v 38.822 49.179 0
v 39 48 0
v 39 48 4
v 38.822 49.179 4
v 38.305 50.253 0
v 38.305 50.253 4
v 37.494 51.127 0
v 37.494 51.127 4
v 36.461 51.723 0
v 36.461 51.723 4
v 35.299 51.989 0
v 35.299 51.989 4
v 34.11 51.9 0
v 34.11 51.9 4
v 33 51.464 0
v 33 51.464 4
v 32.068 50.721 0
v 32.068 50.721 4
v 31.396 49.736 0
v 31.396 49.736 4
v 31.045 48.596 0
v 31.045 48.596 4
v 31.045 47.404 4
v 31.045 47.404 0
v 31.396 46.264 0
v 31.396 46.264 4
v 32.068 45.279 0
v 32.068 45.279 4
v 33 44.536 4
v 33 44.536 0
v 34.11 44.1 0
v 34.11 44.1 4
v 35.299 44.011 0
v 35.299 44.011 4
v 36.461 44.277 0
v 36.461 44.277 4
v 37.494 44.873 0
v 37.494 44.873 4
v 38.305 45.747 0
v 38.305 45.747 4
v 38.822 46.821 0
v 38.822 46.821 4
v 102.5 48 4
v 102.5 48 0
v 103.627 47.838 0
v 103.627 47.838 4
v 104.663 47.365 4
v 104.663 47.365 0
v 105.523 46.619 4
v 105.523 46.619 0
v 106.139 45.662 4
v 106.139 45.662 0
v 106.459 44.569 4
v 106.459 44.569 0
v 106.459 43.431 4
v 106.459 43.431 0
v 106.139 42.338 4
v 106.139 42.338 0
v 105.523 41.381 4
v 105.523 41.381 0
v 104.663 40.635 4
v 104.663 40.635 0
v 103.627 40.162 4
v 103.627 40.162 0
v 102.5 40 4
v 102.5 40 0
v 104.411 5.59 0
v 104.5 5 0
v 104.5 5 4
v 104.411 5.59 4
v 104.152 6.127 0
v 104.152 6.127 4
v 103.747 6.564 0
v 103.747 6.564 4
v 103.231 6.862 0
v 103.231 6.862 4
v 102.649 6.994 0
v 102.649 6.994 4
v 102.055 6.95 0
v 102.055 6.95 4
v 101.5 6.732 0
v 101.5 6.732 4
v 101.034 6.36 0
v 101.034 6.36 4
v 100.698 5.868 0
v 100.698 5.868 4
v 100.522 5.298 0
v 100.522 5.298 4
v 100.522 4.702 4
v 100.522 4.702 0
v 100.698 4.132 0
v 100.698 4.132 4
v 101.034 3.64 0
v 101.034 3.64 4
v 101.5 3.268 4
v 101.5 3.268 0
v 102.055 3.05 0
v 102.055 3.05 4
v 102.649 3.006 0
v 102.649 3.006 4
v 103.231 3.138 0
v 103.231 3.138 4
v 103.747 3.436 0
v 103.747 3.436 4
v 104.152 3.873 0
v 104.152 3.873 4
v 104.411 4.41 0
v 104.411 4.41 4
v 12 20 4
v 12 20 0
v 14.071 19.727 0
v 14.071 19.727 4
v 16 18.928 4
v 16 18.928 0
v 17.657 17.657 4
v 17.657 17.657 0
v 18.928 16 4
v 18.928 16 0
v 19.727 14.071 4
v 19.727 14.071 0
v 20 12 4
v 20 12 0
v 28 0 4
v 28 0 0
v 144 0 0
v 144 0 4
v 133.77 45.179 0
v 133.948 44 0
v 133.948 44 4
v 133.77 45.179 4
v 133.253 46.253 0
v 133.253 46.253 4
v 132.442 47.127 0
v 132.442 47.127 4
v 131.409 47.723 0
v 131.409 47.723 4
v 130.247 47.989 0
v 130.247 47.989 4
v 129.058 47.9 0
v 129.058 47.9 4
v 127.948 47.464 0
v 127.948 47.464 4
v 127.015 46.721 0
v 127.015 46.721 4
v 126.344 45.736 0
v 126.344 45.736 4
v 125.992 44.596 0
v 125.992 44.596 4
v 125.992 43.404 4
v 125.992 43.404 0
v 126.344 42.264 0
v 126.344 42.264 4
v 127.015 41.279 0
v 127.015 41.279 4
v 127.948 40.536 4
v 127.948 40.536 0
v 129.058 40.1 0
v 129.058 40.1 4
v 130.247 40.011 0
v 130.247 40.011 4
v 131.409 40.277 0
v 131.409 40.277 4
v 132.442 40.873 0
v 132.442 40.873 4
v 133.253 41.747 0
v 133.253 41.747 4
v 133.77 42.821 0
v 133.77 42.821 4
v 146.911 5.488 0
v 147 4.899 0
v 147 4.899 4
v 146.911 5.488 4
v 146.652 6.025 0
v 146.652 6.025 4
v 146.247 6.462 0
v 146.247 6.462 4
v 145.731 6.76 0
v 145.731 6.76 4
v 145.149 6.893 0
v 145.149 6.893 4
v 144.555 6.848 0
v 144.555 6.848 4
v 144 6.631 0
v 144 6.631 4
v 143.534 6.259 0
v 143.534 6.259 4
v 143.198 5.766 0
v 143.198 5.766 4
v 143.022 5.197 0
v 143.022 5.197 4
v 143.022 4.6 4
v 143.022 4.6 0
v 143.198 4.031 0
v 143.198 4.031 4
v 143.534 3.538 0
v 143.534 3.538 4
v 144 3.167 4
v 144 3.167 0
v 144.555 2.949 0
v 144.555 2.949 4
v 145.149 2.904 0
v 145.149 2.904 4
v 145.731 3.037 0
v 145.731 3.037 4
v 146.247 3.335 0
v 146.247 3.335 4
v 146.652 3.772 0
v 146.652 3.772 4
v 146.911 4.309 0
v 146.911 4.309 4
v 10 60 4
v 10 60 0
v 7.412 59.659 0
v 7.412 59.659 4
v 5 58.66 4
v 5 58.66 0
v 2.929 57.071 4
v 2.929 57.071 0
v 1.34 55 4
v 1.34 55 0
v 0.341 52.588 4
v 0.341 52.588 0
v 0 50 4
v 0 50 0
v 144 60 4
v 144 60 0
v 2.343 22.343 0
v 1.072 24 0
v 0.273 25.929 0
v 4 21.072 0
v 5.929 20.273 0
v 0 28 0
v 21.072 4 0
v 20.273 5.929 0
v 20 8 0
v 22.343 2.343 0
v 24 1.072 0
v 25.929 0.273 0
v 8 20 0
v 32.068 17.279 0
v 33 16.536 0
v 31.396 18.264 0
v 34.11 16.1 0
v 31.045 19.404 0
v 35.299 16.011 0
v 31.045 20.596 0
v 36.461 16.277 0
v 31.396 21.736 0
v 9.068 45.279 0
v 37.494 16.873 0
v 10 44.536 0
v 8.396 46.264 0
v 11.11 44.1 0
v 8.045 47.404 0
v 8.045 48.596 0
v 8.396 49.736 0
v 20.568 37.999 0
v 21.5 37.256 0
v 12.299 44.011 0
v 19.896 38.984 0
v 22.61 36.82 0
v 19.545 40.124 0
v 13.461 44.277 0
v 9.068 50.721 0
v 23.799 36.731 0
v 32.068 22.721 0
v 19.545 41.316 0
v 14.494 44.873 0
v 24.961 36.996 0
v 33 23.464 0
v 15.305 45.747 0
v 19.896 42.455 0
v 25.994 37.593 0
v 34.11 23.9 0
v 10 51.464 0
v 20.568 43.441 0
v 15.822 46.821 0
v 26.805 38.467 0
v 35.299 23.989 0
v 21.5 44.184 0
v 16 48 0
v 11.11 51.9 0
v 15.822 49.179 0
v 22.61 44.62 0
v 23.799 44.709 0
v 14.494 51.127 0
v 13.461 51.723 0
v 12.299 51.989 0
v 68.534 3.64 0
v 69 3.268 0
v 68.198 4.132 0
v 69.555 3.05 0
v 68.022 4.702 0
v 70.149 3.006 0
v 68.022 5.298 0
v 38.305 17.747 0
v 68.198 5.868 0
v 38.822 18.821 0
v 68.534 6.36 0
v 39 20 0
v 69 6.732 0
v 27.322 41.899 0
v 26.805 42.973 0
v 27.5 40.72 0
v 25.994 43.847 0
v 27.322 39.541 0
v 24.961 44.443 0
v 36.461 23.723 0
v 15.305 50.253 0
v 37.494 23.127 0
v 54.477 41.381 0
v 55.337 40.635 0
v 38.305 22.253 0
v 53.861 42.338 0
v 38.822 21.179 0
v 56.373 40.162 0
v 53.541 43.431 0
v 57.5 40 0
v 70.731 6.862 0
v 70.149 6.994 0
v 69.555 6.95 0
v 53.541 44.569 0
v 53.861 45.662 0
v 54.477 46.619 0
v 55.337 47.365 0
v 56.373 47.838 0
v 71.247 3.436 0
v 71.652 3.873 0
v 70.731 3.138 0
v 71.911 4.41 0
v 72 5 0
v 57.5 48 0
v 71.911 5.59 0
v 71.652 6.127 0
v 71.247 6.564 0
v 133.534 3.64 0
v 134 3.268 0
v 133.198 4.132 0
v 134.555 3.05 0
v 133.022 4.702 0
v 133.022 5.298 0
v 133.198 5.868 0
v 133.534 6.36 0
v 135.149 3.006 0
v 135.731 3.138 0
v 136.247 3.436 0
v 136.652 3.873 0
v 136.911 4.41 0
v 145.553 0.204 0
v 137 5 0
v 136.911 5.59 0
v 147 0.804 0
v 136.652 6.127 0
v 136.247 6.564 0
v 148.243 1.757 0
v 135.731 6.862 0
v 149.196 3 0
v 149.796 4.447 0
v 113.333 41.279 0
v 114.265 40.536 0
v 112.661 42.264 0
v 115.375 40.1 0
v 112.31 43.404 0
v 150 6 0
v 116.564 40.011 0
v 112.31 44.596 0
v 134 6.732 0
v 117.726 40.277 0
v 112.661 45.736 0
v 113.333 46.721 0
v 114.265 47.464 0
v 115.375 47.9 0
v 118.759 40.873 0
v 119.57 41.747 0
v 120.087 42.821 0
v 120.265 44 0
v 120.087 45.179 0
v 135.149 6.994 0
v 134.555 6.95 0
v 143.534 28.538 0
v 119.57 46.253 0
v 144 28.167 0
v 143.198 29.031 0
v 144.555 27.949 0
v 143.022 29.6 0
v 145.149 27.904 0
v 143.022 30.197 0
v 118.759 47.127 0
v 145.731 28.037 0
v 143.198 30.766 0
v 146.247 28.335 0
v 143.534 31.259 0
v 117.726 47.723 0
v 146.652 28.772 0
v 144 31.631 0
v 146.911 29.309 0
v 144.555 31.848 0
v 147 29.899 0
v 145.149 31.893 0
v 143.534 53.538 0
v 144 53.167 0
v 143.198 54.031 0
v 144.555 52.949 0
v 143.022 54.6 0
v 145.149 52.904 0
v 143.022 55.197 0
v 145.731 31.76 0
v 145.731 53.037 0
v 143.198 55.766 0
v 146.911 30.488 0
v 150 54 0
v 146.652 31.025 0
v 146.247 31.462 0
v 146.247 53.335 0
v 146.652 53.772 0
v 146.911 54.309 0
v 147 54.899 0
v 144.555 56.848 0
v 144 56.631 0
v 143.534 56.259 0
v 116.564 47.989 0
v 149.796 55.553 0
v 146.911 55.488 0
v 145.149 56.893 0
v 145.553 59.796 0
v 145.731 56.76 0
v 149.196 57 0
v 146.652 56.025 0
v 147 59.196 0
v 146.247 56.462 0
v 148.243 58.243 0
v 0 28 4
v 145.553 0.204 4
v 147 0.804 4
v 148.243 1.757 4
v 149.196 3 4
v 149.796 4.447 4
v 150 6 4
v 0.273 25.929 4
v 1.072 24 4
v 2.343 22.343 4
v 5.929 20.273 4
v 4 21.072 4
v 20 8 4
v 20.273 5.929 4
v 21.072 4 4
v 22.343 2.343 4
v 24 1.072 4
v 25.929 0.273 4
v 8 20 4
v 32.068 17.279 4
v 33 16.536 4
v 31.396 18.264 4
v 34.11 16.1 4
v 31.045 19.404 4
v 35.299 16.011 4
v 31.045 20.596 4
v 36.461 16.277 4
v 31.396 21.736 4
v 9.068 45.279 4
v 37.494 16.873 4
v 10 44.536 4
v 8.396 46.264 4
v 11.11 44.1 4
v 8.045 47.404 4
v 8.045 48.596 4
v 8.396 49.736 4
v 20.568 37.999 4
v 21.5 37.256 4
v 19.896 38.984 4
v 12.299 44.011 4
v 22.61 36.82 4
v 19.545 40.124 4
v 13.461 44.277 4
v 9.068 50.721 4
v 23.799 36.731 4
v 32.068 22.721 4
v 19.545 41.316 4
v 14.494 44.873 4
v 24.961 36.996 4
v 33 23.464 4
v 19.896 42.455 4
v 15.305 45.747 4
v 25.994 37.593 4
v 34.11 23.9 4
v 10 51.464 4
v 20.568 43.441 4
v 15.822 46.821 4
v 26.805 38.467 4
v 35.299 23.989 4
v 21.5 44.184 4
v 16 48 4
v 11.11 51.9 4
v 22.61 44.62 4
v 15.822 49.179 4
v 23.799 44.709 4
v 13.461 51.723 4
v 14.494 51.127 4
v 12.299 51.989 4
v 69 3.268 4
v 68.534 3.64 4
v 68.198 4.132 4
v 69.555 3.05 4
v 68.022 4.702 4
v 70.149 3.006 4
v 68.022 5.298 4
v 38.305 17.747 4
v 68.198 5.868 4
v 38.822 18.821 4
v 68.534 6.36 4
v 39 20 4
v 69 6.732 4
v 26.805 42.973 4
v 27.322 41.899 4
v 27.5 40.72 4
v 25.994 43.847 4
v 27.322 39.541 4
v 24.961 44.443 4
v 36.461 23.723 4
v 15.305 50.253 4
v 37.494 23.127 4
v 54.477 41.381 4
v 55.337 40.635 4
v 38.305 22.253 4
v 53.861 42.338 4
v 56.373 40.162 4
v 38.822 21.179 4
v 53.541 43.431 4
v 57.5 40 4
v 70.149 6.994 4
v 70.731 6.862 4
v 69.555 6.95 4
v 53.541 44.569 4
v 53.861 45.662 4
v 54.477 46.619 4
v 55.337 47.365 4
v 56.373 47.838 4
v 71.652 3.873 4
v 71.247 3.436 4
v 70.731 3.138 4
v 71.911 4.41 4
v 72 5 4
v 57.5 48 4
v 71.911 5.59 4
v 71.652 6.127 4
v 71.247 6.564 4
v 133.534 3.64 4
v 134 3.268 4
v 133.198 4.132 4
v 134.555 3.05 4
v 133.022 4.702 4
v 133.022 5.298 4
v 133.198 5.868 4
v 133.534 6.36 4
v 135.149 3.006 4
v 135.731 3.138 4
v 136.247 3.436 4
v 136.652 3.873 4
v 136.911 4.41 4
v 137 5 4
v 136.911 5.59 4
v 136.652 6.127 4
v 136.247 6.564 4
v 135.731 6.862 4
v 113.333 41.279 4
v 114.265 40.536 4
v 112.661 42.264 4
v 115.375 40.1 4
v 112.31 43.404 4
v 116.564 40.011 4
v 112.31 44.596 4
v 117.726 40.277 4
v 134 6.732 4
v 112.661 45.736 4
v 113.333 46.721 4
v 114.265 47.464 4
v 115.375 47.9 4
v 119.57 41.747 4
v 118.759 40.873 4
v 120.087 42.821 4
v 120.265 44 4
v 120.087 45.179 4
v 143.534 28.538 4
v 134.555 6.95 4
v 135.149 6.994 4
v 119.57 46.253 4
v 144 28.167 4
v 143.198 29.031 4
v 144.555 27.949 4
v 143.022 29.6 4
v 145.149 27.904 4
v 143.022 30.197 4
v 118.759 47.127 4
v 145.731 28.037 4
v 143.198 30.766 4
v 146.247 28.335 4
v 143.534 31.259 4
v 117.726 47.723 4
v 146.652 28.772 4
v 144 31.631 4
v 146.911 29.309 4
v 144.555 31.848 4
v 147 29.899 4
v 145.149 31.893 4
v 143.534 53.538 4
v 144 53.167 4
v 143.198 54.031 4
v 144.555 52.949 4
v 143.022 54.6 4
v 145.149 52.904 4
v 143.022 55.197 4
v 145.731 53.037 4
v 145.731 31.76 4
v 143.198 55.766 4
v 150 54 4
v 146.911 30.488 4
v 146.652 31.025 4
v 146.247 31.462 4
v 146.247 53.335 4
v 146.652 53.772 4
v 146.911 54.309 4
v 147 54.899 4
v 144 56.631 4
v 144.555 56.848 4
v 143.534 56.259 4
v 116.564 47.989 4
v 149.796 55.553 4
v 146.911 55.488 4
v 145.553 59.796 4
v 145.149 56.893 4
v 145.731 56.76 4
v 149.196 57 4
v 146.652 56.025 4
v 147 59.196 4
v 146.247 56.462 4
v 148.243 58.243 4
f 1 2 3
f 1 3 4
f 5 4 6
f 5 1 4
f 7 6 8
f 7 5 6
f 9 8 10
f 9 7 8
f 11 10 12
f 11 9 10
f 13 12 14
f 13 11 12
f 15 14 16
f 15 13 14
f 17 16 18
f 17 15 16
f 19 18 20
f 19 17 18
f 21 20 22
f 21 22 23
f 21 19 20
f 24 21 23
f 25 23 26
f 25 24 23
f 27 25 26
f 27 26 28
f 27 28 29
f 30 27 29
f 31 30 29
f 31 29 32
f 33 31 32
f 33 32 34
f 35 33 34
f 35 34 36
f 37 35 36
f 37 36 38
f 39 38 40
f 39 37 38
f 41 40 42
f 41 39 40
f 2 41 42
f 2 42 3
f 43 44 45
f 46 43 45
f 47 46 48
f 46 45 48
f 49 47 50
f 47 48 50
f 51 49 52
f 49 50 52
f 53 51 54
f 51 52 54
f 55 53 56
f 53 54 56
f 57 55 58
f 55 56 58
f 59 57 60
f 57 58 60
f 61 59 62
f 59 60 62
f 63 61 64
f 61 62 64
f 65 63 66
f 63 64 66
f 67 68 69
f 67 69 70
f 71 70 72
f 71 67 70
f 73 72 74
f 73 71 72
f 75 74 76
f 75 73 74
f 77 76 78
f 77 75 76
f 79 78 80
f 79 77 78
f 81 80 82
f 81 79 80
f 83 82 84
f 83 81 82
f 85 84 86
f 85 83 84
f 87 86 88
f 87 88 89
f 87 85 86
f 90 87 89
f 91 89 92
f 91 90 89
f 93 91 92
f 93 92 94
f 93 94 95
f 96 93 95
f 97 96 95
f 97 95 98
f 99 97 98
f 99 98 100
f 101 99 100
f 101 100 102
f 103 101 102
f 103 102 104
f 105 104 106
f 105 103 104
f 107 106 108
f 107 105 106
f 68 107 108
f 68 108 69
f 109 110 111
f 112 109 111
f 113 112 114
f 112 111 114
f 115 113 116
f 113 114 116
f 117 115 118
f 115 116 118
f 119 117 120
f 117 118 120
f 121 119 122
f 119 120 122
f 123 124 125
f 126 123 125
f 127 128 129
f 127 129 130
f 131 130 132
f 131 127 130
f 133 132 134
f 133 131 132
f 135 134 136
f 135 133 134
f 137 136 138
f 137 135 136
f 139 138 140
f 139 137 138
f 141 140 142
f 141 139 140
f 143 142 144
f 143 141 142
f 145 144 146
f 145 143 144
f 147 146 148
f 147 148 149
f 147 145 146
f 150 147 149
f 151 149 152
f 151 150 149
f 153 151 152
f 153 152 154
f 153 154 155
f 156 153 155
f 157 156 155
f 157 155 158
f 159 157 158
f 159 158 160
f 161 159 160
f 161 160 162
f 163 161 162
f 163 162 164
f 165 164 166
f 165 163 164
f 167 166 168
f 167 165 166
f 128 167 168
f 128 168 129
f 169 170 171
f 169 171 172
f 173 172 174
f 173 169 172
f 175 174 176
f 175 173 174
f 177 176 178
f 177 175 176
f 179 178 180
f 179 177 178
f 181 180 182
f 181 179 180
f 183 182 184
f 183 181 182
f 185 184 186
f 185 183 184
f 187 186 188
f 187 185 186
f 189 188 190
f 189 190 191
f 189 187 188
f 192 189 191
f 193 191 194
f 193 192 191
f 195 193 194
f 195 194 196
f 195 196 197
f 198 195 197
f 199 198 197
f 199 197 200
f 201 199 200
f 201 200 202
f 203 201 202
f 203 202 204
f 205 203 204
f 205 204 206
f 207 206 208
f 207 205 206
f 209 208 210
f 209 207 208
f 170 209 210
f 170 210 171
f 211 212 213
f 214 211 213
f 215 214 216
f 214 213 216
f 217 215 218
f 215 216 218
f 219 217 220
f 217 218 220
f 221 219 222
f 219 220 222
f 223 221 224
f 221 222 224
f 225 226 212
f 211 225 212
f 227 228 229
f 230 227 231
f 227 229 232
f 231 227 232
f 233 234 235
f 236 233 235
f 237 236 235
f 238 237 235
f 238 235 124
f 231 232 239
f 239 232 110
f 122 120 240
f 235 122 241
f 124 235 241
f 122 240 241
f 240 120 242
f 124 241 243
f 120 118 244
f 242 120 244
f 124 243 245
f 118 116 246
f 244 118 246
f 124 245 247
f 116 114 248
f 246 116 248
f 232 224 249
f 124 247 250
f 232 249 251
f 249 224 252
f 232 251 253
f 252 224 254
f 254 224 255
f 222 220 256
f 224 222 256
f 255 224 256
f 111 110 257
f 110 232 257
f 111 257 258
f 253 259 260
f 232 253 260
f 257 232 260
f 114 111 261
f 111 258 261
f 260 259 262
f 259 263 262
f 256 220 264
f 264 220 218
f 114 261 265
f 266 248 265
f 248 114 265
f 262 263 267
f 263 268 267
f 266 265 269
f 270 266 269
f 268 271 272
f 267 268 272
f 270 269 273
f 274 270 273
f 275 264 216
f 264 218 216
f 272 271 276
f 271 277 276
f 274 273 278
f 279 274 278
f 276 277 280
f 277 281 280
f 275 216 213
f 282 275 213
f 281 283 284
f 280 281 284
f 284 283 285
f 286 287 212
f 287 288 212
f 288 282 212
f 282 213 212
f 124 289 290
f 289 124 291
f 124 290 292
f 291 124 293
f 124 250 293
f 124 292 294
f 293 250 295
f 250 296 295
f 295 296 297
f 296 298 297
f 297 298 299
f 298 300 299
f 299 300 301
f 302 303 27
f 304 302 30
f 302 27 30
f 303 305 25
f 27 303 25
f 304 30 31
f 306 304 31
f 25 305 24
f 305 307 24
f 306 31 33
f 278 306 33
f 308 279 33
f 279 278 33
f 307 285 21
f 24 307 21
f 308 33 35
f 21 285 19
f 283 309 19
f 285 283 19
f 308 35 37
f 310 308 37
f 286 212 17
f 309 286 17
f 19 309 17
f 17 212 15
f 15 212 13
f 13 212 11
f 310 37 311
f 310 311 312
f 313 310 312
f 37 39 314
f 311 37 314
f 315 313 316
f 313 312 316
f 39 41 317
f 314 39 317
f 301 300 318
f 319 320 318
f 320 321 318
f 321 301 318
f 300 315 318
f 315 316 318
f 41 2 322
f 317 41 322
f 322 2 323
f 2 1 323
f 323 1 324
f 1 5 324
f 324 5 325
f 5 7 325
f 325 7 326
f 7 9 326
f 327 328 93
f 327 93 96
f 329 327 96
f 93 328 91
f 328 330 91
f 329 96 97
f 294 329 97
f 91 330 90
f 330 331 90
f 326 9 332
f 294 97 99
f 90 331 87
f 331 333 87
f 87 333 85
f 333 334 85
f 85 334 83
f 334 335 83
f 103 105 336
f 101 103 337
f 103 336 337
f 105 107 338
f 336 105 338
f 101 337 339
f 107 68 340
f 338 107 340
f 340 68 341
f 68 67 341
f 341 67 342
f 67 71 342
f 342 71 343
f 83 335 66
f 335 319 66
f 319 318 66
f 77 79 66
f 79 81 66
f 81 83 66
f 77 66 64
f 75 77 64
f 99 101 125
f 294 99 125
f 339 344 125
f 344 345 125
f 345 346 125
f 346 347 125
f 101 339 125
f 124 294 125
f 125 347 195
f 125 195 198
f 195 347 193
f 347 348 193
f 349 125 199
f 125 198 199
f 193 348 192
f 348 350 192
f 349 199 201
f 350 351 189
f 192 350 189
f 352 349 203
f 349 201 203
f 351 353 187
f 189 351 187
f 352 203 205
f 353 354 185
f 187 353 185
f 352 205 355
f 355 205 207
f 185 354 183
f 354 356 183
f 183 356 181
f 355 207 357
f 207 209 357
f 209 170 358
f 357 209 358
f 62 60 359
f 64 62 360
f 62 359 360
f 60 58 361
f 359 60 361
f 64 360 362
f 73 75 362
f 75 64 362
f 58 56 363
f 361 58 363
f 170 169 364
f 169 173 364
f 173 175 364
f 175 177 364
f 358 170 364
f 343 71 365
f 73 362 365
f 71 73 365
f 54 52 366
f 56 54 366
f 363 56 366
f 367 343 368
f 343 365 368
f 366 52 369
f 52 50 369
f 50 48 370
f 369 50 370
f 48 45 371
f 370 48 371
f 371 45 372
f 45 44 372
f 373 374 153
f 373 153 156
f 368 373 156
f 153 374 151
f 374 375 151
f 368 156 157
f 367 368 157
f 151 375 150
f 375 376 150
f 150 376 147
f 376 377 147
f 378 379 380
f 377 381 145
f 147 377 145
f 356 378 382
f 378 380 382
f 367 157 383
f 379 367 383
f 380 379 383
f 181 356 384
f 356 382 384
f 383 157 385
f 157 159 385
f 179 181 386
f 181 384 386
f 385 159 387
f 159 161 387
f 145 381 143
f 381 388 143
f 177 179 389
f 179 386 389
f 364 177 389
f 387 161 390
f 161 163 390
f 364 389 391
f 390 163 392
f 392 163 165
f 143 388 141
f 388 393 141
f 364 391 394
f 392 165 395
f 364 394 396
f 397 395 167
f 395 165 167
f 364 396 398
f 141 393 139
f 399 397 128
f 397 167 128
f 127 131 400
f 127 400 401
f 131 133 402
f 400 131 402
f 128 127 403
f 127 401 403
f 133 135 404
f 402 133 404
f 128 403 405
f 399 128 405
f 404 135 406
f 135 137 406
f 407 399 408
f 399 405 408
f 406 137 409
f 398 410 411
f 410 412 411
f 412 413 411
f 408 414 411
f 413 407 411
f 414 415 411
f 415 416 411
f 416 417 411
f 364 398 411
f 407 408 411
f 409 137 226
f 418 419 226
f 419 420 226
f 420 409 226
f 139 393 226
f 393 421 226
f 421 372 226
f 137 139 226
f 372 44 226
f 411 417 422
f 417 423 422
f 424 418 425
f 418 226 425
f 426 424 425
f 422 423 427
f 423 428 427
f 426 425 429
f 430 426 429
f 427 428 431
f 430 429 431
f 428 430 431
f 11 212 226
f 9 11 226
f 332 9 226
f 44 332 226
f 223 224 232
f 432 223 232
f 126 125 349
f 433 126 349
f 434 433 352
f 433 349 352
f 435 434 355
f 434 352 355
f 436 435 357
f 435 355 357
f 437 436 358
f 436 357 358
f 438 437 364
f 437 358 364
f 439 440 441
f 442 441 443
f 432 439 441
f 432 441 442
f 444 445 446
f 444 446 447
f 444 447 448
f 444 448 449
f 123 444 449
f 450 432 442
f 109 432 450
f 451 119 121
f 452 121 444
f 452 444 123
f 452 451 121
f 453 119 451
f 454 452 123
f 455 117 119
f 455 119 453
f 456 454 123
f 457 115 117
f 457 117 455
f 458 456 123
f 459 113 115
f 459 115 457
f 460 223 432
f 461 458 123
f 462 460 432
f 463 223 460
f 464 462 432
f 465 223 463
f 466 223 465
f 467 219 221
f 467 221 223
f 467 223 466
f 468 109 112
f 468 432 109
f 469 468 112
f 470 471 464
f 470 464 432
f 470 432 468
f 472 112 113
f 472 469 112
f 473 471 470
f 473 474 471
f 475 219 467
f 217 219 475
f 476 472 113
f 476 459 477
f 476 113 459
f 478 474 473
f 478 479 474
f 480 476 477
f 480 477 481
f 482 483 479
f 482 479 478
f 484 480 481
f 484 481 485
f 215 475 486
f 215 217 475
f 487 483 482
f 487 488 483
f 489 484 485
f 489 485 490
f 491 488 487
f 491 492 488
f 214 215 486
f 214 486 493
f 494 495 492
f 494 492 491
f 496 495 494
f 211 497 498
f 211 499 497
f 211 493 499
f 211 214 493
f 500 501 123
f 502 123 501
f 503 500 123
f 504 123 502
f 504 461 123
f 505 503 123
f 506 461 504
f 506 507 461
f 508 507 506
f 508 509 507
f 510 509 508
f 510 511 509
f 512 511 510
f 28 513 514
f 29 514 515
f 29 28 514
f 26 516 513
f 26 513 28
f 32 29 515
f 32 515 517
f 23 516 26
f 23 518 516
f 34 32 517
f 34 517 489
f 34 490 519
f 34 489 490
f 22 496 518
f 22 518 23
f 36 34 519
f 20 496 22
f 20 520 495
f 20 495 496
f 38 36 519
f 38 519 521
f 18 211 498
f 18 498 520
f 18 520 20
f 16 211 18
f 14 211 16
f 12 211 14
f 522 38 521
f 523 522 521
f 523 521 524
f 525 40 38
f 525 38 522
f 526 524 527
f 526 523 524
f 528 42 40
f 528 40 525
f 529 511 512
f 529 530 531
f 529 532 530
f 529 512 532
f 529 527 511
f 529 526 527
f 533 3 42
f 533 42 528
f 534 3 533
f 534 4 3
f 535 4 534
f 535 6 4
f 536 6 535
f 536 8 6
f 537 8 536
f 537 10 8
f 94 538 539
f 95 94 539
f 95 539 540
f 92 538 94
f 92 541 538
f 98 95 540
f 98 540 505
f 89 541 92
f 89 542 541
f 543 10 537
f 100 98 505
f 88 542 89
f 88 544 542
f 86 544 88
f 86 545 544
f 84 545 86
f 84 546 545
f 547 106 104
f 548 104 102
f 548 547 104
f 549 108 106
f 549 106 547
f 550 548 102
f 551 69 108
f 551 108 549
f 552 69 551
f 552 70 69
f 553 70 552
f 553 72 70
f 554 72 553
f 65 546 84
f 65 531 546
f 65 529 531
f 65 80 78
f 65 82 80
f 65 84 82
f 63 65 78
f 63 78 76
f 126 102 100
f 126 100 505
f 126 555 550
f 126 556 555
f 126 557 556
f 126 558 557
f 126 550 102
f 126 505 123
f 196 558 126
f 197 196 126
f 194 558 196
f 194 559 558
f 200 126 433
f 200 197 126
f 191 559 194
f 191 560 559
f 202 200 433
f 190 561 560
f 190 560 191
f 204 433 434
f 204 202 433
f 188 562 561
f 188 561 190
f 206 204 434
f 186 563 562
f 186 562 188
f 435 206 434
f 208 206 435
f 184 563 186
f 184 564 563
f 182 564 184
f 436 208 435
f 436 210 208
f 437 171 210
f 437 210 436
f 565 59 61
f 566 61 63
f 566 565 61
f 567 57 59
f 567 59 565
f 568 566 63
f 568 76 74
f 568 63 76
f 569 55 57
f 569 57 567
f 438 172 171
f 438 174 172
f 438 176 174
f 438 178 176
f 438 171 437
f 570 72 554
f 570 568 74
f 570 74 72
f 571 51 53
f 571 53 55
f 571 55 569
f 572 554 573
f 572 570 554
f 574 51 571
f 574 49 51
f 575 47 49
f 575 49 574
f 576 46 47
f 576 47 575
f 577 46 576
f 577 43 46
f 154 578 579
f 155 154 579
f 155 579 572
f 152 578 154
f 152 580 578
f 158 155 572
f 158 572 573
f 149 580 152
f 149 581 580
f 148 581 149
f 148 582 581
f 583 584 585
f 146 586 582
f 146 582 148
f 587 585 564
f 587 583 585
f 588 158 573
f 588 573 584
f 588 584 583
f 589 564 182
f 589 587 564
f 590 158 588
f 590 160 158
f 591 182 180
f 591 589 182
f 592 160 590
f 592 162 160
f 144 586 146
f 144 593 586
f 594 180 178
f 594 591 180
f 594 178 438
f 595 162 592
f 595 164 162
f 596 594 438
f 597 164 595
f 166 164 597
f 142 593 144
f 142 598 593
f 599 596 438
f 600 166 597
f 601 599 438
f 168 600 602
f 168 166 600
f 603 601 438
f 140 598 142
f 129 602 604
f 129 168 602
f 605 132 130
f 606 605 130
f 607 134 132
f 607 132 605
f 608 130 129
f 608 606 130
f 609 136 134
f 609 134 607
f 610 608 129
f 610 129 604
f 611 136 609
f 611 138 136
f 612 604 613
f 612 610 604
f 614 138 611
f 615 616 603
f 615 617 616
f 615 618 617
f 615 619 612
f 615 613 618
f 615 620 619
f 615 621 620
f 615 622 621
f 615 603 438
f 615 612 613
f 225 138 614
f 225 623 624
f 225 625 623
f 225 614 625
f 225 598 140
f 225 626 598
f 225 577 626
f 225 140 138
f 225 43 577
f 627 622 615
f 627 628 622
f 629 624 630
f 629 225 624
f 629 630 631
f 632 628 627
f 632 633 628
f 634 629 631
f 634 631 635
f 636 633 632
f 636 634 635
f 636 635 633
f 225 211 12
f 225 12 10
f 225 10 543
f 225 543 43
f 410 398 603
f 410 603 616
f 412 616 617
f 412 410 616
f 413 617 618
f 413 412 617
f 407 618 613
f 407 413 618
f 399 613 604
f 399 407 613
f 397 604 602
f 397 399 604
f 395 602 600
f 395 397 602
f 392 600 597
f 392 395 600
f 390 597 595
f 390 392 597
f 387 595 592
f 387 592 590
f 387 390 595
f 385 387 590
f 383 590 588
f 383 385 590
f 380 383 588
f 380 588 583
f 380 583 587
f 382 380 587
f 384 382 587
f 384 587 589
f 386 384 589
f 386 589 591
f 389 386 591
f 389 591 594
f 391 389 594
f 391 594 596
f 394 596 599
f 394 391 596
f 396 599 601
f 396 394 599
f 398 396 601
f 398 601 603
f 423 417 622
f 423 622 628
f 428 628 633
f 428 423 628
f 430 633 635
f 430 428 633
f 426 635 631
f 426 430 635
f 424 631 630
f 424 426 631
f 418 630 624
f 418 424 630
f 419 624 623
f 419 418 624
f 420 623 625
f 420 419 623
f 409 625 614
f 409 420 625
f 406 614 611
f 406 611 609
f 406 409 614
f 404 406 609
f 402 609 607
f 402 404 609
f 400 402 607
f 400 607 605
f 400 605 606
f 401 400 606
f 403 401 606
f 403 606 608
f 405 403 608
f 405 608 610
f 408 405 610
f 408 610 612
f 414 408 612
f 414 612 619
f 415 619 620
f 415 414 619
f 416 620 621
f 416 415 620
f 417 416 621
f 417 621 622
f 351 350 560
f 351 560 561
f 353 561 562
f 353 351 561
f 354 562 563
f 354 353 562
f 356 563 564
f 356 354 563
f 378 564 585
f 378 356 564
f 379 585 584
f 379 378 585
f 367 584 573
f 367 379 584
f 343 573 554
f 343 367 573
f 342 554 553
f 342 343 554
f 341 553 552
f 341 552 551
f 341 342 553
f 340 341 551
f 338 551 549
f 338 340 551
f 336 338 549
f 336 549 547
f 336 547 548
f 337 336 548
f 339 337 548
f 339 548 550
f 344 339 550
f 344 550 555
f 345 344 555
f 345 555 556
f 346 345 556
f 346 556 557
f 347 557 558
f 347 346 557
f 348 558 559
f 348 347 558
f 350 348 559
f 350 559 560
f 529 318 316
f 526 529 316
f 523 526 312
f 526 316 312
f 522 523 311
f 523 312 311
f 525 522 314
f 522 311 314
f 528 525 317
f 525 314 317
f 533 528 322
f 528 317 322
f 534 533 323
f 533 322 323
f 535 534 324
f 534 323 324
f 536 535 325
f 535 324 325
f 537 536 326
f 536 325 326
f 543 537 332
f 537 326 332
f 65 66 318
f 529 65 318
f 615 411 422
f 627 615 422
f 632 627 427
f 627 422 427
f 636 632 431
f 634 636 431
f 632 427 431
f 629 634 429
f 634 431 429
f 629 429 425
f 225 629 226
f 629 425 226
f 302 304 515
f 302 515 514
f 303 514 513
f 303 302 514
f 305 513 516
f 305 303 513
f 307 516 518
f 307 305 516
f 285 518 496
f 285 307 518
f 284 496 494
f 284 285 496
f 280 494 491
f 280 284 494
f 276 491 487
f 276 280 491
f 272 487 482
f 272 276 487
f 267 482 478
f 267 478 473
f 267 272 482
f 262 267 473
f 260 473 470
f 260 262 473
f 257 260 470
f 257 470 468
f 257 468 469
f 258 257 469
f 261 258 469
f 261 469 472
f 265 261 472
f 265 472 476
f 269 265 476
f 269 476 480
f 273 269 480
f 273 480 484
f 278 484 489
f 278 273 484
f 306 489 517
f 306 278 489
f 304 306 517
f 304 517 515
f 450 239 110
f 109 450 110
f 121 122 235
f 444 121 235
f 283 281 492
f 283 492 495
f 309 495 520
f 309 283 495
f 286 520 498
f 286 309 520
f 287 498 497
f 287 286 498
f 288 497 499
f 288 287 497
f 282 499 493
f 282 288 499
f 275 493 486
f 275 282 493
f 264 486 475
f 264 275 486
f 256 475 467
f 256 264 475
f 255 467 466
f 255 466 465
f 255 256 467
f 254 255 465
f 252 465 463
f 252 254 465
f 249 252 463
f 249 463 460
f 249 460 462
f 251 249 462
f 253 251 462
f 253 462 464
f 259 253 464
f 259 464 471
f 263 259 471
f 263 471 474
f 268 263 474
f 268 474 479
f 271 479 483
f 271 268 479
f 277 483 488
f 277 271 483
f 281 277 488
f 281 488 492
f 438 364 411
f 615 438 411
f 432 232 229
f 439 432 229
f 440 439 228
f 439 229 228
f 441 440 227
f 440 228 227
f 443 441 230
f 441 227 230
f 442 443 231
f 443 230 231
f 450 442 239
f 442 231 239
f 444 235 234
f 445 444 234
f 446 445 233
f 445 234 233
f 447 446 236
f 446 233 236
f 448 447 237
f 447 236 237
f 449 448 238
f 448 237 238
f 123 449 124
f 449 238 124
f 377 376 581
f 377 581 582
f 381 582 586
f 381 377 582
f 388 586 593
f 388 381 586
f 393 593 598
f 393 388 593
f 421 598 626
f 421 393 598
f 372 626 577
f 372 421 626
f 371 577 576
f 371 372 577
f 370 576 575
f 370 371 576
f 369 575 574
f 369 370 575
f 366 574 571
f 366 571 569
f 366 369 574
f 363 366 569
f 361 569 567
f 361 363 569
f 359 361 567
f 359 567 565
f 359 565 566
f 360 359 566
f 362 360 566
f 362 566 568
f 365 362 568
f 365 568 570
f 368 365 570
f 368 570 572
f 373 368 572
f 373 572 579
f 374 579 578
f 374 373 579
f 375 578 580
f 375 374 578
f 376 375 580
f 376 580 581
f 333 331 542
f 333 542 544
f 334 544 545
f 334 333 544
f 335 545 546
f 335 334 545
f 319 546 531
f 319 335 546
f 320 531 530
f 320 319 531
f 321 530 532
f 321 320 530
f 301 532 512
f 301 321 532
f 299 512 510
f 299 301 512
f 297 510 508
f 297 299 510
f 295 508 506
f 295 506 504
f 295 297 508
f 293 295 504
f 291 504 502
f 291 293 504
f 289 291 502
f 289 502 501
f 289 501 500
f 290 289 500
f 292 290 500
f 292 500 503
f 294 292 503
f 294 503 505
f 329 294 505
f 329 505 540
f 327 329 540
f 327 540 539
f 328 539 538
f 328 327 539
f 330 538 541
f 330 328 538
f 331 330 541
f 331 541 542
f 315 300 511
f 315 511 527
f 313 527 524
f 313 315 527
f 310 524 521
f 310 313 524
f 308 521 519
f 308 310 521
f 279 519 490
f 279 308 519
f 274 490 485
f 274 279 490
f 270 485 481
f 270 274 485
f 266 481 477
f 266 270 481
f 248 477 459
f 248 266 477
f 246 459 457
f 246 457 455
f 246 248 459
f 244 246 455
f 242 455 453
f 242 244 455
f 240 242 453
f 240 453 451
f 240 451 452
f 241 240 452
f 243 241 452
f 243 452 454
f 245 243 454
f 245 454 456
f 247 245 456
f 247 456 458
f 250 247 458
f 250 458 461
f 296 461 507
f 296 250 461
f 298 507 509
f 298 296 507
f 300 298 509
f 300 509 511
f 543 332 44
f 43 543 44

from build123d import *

# Parameters (mm, degrees)
SKETCH1_R           = 4
SKETCH1_R_2         = 2
BOSS_EXTRUDE1_DEPTH = 4


with BuildPart() as part:
    # Sketch1 → Boss-Extrude1 (new body)
    with BuildSketch(Plane.XY):
        with BuildLine():
            Line((28, 0), (140, 0))
            Line((140, 0), (144, 0))
            ThreePointArc((144, 0), (148.242640687, 1.757359313), (150, 6))
            Line((150, 6), (150, 54))
            ThreePointArc((150, 54), (148.242640687, 58.242640687), (144, 60))
            Line((144, 60), (140, 60))
            Line((140, 60), (10, 60))
            ThreePointArc((10, 60), (2.928932188, 57.071067812), (0, 50))
            Line((0, 50), (0, 28))
            ThreePointArc((0, 28), (2.343145751, 22.343145751), (8, 20))
            Line((8, 20), (12, 20))
            ThreePointArc((12, 20), (17.656854249, 17.656854249), (20, 12))
            Line((20, 12), (20, 8))
            ThreePointArc((20, 8), (22.343145751, 2.343145751), (28, 0))
        make_face()
        with Locations((35, 20)):
            Circle(SKETCH1_R, mode=Mode.SUBTRACT)
        with Locations((116.264838239, 44)):
            Circle(SKETCH1_R, mode=Mode.SUBTRACT)
        with Locations((129.947688147, 44)):
            Circle(SKETCH1_R, mode=Mode.SUBTRACT)
        with Locations((12, 48)):
            Circle(SKETCH1_R, mode=Mode.SUBTRACT)
        with Locations((23.5, 40.719874776)):
            Circle(SKETCH1_R, mode=Mode.SUBTRACT)
        with Locations((35, 48)):
            Circle(SKETCH1_R, mode=Mode.SUBTRACT)
        with Locations((135, 5)):
            Circle(SKETCH1_R_2, mode=Mode.SUBTRACT)
        with Locations((102.5, 5)):
            Circle(SKETCH1_R_2, mode=Mode.SUBTRACT)
        with Locations((70, 5)):
            Circle(SKETCH1_R_2, mode=Mode.SUBTRACT)
        with Locations((145, 54.898560305)):
            Circle(SKETCH1_R_2, mode=Mode.SUBTRACT)
        with Locations((145, 29.898560305)):
            Circle(SKETCH1_R_2, mode=Mode.SUBTRACT)
        with Locations((145, 4.898560305)):
            Circle(SKETCH1_R_2, mode=Mode.SUBTRACT)
        with BuildLine():
            Line((57.5, 48), (102.5, 48))
            ThreePointArc((102.5, 48), (106.5, 44), (102.5, 40))
            Line((102.5, 40), (57.5, 40))
            ThreePointArc((57.5, 40), (53.5, 44), (57.5, 48))
        make_face(mode=Mode.SUBTRACT)
    extrude(amount=BOSS_EXTRUDE1_DEPTH)


solid = part.part
